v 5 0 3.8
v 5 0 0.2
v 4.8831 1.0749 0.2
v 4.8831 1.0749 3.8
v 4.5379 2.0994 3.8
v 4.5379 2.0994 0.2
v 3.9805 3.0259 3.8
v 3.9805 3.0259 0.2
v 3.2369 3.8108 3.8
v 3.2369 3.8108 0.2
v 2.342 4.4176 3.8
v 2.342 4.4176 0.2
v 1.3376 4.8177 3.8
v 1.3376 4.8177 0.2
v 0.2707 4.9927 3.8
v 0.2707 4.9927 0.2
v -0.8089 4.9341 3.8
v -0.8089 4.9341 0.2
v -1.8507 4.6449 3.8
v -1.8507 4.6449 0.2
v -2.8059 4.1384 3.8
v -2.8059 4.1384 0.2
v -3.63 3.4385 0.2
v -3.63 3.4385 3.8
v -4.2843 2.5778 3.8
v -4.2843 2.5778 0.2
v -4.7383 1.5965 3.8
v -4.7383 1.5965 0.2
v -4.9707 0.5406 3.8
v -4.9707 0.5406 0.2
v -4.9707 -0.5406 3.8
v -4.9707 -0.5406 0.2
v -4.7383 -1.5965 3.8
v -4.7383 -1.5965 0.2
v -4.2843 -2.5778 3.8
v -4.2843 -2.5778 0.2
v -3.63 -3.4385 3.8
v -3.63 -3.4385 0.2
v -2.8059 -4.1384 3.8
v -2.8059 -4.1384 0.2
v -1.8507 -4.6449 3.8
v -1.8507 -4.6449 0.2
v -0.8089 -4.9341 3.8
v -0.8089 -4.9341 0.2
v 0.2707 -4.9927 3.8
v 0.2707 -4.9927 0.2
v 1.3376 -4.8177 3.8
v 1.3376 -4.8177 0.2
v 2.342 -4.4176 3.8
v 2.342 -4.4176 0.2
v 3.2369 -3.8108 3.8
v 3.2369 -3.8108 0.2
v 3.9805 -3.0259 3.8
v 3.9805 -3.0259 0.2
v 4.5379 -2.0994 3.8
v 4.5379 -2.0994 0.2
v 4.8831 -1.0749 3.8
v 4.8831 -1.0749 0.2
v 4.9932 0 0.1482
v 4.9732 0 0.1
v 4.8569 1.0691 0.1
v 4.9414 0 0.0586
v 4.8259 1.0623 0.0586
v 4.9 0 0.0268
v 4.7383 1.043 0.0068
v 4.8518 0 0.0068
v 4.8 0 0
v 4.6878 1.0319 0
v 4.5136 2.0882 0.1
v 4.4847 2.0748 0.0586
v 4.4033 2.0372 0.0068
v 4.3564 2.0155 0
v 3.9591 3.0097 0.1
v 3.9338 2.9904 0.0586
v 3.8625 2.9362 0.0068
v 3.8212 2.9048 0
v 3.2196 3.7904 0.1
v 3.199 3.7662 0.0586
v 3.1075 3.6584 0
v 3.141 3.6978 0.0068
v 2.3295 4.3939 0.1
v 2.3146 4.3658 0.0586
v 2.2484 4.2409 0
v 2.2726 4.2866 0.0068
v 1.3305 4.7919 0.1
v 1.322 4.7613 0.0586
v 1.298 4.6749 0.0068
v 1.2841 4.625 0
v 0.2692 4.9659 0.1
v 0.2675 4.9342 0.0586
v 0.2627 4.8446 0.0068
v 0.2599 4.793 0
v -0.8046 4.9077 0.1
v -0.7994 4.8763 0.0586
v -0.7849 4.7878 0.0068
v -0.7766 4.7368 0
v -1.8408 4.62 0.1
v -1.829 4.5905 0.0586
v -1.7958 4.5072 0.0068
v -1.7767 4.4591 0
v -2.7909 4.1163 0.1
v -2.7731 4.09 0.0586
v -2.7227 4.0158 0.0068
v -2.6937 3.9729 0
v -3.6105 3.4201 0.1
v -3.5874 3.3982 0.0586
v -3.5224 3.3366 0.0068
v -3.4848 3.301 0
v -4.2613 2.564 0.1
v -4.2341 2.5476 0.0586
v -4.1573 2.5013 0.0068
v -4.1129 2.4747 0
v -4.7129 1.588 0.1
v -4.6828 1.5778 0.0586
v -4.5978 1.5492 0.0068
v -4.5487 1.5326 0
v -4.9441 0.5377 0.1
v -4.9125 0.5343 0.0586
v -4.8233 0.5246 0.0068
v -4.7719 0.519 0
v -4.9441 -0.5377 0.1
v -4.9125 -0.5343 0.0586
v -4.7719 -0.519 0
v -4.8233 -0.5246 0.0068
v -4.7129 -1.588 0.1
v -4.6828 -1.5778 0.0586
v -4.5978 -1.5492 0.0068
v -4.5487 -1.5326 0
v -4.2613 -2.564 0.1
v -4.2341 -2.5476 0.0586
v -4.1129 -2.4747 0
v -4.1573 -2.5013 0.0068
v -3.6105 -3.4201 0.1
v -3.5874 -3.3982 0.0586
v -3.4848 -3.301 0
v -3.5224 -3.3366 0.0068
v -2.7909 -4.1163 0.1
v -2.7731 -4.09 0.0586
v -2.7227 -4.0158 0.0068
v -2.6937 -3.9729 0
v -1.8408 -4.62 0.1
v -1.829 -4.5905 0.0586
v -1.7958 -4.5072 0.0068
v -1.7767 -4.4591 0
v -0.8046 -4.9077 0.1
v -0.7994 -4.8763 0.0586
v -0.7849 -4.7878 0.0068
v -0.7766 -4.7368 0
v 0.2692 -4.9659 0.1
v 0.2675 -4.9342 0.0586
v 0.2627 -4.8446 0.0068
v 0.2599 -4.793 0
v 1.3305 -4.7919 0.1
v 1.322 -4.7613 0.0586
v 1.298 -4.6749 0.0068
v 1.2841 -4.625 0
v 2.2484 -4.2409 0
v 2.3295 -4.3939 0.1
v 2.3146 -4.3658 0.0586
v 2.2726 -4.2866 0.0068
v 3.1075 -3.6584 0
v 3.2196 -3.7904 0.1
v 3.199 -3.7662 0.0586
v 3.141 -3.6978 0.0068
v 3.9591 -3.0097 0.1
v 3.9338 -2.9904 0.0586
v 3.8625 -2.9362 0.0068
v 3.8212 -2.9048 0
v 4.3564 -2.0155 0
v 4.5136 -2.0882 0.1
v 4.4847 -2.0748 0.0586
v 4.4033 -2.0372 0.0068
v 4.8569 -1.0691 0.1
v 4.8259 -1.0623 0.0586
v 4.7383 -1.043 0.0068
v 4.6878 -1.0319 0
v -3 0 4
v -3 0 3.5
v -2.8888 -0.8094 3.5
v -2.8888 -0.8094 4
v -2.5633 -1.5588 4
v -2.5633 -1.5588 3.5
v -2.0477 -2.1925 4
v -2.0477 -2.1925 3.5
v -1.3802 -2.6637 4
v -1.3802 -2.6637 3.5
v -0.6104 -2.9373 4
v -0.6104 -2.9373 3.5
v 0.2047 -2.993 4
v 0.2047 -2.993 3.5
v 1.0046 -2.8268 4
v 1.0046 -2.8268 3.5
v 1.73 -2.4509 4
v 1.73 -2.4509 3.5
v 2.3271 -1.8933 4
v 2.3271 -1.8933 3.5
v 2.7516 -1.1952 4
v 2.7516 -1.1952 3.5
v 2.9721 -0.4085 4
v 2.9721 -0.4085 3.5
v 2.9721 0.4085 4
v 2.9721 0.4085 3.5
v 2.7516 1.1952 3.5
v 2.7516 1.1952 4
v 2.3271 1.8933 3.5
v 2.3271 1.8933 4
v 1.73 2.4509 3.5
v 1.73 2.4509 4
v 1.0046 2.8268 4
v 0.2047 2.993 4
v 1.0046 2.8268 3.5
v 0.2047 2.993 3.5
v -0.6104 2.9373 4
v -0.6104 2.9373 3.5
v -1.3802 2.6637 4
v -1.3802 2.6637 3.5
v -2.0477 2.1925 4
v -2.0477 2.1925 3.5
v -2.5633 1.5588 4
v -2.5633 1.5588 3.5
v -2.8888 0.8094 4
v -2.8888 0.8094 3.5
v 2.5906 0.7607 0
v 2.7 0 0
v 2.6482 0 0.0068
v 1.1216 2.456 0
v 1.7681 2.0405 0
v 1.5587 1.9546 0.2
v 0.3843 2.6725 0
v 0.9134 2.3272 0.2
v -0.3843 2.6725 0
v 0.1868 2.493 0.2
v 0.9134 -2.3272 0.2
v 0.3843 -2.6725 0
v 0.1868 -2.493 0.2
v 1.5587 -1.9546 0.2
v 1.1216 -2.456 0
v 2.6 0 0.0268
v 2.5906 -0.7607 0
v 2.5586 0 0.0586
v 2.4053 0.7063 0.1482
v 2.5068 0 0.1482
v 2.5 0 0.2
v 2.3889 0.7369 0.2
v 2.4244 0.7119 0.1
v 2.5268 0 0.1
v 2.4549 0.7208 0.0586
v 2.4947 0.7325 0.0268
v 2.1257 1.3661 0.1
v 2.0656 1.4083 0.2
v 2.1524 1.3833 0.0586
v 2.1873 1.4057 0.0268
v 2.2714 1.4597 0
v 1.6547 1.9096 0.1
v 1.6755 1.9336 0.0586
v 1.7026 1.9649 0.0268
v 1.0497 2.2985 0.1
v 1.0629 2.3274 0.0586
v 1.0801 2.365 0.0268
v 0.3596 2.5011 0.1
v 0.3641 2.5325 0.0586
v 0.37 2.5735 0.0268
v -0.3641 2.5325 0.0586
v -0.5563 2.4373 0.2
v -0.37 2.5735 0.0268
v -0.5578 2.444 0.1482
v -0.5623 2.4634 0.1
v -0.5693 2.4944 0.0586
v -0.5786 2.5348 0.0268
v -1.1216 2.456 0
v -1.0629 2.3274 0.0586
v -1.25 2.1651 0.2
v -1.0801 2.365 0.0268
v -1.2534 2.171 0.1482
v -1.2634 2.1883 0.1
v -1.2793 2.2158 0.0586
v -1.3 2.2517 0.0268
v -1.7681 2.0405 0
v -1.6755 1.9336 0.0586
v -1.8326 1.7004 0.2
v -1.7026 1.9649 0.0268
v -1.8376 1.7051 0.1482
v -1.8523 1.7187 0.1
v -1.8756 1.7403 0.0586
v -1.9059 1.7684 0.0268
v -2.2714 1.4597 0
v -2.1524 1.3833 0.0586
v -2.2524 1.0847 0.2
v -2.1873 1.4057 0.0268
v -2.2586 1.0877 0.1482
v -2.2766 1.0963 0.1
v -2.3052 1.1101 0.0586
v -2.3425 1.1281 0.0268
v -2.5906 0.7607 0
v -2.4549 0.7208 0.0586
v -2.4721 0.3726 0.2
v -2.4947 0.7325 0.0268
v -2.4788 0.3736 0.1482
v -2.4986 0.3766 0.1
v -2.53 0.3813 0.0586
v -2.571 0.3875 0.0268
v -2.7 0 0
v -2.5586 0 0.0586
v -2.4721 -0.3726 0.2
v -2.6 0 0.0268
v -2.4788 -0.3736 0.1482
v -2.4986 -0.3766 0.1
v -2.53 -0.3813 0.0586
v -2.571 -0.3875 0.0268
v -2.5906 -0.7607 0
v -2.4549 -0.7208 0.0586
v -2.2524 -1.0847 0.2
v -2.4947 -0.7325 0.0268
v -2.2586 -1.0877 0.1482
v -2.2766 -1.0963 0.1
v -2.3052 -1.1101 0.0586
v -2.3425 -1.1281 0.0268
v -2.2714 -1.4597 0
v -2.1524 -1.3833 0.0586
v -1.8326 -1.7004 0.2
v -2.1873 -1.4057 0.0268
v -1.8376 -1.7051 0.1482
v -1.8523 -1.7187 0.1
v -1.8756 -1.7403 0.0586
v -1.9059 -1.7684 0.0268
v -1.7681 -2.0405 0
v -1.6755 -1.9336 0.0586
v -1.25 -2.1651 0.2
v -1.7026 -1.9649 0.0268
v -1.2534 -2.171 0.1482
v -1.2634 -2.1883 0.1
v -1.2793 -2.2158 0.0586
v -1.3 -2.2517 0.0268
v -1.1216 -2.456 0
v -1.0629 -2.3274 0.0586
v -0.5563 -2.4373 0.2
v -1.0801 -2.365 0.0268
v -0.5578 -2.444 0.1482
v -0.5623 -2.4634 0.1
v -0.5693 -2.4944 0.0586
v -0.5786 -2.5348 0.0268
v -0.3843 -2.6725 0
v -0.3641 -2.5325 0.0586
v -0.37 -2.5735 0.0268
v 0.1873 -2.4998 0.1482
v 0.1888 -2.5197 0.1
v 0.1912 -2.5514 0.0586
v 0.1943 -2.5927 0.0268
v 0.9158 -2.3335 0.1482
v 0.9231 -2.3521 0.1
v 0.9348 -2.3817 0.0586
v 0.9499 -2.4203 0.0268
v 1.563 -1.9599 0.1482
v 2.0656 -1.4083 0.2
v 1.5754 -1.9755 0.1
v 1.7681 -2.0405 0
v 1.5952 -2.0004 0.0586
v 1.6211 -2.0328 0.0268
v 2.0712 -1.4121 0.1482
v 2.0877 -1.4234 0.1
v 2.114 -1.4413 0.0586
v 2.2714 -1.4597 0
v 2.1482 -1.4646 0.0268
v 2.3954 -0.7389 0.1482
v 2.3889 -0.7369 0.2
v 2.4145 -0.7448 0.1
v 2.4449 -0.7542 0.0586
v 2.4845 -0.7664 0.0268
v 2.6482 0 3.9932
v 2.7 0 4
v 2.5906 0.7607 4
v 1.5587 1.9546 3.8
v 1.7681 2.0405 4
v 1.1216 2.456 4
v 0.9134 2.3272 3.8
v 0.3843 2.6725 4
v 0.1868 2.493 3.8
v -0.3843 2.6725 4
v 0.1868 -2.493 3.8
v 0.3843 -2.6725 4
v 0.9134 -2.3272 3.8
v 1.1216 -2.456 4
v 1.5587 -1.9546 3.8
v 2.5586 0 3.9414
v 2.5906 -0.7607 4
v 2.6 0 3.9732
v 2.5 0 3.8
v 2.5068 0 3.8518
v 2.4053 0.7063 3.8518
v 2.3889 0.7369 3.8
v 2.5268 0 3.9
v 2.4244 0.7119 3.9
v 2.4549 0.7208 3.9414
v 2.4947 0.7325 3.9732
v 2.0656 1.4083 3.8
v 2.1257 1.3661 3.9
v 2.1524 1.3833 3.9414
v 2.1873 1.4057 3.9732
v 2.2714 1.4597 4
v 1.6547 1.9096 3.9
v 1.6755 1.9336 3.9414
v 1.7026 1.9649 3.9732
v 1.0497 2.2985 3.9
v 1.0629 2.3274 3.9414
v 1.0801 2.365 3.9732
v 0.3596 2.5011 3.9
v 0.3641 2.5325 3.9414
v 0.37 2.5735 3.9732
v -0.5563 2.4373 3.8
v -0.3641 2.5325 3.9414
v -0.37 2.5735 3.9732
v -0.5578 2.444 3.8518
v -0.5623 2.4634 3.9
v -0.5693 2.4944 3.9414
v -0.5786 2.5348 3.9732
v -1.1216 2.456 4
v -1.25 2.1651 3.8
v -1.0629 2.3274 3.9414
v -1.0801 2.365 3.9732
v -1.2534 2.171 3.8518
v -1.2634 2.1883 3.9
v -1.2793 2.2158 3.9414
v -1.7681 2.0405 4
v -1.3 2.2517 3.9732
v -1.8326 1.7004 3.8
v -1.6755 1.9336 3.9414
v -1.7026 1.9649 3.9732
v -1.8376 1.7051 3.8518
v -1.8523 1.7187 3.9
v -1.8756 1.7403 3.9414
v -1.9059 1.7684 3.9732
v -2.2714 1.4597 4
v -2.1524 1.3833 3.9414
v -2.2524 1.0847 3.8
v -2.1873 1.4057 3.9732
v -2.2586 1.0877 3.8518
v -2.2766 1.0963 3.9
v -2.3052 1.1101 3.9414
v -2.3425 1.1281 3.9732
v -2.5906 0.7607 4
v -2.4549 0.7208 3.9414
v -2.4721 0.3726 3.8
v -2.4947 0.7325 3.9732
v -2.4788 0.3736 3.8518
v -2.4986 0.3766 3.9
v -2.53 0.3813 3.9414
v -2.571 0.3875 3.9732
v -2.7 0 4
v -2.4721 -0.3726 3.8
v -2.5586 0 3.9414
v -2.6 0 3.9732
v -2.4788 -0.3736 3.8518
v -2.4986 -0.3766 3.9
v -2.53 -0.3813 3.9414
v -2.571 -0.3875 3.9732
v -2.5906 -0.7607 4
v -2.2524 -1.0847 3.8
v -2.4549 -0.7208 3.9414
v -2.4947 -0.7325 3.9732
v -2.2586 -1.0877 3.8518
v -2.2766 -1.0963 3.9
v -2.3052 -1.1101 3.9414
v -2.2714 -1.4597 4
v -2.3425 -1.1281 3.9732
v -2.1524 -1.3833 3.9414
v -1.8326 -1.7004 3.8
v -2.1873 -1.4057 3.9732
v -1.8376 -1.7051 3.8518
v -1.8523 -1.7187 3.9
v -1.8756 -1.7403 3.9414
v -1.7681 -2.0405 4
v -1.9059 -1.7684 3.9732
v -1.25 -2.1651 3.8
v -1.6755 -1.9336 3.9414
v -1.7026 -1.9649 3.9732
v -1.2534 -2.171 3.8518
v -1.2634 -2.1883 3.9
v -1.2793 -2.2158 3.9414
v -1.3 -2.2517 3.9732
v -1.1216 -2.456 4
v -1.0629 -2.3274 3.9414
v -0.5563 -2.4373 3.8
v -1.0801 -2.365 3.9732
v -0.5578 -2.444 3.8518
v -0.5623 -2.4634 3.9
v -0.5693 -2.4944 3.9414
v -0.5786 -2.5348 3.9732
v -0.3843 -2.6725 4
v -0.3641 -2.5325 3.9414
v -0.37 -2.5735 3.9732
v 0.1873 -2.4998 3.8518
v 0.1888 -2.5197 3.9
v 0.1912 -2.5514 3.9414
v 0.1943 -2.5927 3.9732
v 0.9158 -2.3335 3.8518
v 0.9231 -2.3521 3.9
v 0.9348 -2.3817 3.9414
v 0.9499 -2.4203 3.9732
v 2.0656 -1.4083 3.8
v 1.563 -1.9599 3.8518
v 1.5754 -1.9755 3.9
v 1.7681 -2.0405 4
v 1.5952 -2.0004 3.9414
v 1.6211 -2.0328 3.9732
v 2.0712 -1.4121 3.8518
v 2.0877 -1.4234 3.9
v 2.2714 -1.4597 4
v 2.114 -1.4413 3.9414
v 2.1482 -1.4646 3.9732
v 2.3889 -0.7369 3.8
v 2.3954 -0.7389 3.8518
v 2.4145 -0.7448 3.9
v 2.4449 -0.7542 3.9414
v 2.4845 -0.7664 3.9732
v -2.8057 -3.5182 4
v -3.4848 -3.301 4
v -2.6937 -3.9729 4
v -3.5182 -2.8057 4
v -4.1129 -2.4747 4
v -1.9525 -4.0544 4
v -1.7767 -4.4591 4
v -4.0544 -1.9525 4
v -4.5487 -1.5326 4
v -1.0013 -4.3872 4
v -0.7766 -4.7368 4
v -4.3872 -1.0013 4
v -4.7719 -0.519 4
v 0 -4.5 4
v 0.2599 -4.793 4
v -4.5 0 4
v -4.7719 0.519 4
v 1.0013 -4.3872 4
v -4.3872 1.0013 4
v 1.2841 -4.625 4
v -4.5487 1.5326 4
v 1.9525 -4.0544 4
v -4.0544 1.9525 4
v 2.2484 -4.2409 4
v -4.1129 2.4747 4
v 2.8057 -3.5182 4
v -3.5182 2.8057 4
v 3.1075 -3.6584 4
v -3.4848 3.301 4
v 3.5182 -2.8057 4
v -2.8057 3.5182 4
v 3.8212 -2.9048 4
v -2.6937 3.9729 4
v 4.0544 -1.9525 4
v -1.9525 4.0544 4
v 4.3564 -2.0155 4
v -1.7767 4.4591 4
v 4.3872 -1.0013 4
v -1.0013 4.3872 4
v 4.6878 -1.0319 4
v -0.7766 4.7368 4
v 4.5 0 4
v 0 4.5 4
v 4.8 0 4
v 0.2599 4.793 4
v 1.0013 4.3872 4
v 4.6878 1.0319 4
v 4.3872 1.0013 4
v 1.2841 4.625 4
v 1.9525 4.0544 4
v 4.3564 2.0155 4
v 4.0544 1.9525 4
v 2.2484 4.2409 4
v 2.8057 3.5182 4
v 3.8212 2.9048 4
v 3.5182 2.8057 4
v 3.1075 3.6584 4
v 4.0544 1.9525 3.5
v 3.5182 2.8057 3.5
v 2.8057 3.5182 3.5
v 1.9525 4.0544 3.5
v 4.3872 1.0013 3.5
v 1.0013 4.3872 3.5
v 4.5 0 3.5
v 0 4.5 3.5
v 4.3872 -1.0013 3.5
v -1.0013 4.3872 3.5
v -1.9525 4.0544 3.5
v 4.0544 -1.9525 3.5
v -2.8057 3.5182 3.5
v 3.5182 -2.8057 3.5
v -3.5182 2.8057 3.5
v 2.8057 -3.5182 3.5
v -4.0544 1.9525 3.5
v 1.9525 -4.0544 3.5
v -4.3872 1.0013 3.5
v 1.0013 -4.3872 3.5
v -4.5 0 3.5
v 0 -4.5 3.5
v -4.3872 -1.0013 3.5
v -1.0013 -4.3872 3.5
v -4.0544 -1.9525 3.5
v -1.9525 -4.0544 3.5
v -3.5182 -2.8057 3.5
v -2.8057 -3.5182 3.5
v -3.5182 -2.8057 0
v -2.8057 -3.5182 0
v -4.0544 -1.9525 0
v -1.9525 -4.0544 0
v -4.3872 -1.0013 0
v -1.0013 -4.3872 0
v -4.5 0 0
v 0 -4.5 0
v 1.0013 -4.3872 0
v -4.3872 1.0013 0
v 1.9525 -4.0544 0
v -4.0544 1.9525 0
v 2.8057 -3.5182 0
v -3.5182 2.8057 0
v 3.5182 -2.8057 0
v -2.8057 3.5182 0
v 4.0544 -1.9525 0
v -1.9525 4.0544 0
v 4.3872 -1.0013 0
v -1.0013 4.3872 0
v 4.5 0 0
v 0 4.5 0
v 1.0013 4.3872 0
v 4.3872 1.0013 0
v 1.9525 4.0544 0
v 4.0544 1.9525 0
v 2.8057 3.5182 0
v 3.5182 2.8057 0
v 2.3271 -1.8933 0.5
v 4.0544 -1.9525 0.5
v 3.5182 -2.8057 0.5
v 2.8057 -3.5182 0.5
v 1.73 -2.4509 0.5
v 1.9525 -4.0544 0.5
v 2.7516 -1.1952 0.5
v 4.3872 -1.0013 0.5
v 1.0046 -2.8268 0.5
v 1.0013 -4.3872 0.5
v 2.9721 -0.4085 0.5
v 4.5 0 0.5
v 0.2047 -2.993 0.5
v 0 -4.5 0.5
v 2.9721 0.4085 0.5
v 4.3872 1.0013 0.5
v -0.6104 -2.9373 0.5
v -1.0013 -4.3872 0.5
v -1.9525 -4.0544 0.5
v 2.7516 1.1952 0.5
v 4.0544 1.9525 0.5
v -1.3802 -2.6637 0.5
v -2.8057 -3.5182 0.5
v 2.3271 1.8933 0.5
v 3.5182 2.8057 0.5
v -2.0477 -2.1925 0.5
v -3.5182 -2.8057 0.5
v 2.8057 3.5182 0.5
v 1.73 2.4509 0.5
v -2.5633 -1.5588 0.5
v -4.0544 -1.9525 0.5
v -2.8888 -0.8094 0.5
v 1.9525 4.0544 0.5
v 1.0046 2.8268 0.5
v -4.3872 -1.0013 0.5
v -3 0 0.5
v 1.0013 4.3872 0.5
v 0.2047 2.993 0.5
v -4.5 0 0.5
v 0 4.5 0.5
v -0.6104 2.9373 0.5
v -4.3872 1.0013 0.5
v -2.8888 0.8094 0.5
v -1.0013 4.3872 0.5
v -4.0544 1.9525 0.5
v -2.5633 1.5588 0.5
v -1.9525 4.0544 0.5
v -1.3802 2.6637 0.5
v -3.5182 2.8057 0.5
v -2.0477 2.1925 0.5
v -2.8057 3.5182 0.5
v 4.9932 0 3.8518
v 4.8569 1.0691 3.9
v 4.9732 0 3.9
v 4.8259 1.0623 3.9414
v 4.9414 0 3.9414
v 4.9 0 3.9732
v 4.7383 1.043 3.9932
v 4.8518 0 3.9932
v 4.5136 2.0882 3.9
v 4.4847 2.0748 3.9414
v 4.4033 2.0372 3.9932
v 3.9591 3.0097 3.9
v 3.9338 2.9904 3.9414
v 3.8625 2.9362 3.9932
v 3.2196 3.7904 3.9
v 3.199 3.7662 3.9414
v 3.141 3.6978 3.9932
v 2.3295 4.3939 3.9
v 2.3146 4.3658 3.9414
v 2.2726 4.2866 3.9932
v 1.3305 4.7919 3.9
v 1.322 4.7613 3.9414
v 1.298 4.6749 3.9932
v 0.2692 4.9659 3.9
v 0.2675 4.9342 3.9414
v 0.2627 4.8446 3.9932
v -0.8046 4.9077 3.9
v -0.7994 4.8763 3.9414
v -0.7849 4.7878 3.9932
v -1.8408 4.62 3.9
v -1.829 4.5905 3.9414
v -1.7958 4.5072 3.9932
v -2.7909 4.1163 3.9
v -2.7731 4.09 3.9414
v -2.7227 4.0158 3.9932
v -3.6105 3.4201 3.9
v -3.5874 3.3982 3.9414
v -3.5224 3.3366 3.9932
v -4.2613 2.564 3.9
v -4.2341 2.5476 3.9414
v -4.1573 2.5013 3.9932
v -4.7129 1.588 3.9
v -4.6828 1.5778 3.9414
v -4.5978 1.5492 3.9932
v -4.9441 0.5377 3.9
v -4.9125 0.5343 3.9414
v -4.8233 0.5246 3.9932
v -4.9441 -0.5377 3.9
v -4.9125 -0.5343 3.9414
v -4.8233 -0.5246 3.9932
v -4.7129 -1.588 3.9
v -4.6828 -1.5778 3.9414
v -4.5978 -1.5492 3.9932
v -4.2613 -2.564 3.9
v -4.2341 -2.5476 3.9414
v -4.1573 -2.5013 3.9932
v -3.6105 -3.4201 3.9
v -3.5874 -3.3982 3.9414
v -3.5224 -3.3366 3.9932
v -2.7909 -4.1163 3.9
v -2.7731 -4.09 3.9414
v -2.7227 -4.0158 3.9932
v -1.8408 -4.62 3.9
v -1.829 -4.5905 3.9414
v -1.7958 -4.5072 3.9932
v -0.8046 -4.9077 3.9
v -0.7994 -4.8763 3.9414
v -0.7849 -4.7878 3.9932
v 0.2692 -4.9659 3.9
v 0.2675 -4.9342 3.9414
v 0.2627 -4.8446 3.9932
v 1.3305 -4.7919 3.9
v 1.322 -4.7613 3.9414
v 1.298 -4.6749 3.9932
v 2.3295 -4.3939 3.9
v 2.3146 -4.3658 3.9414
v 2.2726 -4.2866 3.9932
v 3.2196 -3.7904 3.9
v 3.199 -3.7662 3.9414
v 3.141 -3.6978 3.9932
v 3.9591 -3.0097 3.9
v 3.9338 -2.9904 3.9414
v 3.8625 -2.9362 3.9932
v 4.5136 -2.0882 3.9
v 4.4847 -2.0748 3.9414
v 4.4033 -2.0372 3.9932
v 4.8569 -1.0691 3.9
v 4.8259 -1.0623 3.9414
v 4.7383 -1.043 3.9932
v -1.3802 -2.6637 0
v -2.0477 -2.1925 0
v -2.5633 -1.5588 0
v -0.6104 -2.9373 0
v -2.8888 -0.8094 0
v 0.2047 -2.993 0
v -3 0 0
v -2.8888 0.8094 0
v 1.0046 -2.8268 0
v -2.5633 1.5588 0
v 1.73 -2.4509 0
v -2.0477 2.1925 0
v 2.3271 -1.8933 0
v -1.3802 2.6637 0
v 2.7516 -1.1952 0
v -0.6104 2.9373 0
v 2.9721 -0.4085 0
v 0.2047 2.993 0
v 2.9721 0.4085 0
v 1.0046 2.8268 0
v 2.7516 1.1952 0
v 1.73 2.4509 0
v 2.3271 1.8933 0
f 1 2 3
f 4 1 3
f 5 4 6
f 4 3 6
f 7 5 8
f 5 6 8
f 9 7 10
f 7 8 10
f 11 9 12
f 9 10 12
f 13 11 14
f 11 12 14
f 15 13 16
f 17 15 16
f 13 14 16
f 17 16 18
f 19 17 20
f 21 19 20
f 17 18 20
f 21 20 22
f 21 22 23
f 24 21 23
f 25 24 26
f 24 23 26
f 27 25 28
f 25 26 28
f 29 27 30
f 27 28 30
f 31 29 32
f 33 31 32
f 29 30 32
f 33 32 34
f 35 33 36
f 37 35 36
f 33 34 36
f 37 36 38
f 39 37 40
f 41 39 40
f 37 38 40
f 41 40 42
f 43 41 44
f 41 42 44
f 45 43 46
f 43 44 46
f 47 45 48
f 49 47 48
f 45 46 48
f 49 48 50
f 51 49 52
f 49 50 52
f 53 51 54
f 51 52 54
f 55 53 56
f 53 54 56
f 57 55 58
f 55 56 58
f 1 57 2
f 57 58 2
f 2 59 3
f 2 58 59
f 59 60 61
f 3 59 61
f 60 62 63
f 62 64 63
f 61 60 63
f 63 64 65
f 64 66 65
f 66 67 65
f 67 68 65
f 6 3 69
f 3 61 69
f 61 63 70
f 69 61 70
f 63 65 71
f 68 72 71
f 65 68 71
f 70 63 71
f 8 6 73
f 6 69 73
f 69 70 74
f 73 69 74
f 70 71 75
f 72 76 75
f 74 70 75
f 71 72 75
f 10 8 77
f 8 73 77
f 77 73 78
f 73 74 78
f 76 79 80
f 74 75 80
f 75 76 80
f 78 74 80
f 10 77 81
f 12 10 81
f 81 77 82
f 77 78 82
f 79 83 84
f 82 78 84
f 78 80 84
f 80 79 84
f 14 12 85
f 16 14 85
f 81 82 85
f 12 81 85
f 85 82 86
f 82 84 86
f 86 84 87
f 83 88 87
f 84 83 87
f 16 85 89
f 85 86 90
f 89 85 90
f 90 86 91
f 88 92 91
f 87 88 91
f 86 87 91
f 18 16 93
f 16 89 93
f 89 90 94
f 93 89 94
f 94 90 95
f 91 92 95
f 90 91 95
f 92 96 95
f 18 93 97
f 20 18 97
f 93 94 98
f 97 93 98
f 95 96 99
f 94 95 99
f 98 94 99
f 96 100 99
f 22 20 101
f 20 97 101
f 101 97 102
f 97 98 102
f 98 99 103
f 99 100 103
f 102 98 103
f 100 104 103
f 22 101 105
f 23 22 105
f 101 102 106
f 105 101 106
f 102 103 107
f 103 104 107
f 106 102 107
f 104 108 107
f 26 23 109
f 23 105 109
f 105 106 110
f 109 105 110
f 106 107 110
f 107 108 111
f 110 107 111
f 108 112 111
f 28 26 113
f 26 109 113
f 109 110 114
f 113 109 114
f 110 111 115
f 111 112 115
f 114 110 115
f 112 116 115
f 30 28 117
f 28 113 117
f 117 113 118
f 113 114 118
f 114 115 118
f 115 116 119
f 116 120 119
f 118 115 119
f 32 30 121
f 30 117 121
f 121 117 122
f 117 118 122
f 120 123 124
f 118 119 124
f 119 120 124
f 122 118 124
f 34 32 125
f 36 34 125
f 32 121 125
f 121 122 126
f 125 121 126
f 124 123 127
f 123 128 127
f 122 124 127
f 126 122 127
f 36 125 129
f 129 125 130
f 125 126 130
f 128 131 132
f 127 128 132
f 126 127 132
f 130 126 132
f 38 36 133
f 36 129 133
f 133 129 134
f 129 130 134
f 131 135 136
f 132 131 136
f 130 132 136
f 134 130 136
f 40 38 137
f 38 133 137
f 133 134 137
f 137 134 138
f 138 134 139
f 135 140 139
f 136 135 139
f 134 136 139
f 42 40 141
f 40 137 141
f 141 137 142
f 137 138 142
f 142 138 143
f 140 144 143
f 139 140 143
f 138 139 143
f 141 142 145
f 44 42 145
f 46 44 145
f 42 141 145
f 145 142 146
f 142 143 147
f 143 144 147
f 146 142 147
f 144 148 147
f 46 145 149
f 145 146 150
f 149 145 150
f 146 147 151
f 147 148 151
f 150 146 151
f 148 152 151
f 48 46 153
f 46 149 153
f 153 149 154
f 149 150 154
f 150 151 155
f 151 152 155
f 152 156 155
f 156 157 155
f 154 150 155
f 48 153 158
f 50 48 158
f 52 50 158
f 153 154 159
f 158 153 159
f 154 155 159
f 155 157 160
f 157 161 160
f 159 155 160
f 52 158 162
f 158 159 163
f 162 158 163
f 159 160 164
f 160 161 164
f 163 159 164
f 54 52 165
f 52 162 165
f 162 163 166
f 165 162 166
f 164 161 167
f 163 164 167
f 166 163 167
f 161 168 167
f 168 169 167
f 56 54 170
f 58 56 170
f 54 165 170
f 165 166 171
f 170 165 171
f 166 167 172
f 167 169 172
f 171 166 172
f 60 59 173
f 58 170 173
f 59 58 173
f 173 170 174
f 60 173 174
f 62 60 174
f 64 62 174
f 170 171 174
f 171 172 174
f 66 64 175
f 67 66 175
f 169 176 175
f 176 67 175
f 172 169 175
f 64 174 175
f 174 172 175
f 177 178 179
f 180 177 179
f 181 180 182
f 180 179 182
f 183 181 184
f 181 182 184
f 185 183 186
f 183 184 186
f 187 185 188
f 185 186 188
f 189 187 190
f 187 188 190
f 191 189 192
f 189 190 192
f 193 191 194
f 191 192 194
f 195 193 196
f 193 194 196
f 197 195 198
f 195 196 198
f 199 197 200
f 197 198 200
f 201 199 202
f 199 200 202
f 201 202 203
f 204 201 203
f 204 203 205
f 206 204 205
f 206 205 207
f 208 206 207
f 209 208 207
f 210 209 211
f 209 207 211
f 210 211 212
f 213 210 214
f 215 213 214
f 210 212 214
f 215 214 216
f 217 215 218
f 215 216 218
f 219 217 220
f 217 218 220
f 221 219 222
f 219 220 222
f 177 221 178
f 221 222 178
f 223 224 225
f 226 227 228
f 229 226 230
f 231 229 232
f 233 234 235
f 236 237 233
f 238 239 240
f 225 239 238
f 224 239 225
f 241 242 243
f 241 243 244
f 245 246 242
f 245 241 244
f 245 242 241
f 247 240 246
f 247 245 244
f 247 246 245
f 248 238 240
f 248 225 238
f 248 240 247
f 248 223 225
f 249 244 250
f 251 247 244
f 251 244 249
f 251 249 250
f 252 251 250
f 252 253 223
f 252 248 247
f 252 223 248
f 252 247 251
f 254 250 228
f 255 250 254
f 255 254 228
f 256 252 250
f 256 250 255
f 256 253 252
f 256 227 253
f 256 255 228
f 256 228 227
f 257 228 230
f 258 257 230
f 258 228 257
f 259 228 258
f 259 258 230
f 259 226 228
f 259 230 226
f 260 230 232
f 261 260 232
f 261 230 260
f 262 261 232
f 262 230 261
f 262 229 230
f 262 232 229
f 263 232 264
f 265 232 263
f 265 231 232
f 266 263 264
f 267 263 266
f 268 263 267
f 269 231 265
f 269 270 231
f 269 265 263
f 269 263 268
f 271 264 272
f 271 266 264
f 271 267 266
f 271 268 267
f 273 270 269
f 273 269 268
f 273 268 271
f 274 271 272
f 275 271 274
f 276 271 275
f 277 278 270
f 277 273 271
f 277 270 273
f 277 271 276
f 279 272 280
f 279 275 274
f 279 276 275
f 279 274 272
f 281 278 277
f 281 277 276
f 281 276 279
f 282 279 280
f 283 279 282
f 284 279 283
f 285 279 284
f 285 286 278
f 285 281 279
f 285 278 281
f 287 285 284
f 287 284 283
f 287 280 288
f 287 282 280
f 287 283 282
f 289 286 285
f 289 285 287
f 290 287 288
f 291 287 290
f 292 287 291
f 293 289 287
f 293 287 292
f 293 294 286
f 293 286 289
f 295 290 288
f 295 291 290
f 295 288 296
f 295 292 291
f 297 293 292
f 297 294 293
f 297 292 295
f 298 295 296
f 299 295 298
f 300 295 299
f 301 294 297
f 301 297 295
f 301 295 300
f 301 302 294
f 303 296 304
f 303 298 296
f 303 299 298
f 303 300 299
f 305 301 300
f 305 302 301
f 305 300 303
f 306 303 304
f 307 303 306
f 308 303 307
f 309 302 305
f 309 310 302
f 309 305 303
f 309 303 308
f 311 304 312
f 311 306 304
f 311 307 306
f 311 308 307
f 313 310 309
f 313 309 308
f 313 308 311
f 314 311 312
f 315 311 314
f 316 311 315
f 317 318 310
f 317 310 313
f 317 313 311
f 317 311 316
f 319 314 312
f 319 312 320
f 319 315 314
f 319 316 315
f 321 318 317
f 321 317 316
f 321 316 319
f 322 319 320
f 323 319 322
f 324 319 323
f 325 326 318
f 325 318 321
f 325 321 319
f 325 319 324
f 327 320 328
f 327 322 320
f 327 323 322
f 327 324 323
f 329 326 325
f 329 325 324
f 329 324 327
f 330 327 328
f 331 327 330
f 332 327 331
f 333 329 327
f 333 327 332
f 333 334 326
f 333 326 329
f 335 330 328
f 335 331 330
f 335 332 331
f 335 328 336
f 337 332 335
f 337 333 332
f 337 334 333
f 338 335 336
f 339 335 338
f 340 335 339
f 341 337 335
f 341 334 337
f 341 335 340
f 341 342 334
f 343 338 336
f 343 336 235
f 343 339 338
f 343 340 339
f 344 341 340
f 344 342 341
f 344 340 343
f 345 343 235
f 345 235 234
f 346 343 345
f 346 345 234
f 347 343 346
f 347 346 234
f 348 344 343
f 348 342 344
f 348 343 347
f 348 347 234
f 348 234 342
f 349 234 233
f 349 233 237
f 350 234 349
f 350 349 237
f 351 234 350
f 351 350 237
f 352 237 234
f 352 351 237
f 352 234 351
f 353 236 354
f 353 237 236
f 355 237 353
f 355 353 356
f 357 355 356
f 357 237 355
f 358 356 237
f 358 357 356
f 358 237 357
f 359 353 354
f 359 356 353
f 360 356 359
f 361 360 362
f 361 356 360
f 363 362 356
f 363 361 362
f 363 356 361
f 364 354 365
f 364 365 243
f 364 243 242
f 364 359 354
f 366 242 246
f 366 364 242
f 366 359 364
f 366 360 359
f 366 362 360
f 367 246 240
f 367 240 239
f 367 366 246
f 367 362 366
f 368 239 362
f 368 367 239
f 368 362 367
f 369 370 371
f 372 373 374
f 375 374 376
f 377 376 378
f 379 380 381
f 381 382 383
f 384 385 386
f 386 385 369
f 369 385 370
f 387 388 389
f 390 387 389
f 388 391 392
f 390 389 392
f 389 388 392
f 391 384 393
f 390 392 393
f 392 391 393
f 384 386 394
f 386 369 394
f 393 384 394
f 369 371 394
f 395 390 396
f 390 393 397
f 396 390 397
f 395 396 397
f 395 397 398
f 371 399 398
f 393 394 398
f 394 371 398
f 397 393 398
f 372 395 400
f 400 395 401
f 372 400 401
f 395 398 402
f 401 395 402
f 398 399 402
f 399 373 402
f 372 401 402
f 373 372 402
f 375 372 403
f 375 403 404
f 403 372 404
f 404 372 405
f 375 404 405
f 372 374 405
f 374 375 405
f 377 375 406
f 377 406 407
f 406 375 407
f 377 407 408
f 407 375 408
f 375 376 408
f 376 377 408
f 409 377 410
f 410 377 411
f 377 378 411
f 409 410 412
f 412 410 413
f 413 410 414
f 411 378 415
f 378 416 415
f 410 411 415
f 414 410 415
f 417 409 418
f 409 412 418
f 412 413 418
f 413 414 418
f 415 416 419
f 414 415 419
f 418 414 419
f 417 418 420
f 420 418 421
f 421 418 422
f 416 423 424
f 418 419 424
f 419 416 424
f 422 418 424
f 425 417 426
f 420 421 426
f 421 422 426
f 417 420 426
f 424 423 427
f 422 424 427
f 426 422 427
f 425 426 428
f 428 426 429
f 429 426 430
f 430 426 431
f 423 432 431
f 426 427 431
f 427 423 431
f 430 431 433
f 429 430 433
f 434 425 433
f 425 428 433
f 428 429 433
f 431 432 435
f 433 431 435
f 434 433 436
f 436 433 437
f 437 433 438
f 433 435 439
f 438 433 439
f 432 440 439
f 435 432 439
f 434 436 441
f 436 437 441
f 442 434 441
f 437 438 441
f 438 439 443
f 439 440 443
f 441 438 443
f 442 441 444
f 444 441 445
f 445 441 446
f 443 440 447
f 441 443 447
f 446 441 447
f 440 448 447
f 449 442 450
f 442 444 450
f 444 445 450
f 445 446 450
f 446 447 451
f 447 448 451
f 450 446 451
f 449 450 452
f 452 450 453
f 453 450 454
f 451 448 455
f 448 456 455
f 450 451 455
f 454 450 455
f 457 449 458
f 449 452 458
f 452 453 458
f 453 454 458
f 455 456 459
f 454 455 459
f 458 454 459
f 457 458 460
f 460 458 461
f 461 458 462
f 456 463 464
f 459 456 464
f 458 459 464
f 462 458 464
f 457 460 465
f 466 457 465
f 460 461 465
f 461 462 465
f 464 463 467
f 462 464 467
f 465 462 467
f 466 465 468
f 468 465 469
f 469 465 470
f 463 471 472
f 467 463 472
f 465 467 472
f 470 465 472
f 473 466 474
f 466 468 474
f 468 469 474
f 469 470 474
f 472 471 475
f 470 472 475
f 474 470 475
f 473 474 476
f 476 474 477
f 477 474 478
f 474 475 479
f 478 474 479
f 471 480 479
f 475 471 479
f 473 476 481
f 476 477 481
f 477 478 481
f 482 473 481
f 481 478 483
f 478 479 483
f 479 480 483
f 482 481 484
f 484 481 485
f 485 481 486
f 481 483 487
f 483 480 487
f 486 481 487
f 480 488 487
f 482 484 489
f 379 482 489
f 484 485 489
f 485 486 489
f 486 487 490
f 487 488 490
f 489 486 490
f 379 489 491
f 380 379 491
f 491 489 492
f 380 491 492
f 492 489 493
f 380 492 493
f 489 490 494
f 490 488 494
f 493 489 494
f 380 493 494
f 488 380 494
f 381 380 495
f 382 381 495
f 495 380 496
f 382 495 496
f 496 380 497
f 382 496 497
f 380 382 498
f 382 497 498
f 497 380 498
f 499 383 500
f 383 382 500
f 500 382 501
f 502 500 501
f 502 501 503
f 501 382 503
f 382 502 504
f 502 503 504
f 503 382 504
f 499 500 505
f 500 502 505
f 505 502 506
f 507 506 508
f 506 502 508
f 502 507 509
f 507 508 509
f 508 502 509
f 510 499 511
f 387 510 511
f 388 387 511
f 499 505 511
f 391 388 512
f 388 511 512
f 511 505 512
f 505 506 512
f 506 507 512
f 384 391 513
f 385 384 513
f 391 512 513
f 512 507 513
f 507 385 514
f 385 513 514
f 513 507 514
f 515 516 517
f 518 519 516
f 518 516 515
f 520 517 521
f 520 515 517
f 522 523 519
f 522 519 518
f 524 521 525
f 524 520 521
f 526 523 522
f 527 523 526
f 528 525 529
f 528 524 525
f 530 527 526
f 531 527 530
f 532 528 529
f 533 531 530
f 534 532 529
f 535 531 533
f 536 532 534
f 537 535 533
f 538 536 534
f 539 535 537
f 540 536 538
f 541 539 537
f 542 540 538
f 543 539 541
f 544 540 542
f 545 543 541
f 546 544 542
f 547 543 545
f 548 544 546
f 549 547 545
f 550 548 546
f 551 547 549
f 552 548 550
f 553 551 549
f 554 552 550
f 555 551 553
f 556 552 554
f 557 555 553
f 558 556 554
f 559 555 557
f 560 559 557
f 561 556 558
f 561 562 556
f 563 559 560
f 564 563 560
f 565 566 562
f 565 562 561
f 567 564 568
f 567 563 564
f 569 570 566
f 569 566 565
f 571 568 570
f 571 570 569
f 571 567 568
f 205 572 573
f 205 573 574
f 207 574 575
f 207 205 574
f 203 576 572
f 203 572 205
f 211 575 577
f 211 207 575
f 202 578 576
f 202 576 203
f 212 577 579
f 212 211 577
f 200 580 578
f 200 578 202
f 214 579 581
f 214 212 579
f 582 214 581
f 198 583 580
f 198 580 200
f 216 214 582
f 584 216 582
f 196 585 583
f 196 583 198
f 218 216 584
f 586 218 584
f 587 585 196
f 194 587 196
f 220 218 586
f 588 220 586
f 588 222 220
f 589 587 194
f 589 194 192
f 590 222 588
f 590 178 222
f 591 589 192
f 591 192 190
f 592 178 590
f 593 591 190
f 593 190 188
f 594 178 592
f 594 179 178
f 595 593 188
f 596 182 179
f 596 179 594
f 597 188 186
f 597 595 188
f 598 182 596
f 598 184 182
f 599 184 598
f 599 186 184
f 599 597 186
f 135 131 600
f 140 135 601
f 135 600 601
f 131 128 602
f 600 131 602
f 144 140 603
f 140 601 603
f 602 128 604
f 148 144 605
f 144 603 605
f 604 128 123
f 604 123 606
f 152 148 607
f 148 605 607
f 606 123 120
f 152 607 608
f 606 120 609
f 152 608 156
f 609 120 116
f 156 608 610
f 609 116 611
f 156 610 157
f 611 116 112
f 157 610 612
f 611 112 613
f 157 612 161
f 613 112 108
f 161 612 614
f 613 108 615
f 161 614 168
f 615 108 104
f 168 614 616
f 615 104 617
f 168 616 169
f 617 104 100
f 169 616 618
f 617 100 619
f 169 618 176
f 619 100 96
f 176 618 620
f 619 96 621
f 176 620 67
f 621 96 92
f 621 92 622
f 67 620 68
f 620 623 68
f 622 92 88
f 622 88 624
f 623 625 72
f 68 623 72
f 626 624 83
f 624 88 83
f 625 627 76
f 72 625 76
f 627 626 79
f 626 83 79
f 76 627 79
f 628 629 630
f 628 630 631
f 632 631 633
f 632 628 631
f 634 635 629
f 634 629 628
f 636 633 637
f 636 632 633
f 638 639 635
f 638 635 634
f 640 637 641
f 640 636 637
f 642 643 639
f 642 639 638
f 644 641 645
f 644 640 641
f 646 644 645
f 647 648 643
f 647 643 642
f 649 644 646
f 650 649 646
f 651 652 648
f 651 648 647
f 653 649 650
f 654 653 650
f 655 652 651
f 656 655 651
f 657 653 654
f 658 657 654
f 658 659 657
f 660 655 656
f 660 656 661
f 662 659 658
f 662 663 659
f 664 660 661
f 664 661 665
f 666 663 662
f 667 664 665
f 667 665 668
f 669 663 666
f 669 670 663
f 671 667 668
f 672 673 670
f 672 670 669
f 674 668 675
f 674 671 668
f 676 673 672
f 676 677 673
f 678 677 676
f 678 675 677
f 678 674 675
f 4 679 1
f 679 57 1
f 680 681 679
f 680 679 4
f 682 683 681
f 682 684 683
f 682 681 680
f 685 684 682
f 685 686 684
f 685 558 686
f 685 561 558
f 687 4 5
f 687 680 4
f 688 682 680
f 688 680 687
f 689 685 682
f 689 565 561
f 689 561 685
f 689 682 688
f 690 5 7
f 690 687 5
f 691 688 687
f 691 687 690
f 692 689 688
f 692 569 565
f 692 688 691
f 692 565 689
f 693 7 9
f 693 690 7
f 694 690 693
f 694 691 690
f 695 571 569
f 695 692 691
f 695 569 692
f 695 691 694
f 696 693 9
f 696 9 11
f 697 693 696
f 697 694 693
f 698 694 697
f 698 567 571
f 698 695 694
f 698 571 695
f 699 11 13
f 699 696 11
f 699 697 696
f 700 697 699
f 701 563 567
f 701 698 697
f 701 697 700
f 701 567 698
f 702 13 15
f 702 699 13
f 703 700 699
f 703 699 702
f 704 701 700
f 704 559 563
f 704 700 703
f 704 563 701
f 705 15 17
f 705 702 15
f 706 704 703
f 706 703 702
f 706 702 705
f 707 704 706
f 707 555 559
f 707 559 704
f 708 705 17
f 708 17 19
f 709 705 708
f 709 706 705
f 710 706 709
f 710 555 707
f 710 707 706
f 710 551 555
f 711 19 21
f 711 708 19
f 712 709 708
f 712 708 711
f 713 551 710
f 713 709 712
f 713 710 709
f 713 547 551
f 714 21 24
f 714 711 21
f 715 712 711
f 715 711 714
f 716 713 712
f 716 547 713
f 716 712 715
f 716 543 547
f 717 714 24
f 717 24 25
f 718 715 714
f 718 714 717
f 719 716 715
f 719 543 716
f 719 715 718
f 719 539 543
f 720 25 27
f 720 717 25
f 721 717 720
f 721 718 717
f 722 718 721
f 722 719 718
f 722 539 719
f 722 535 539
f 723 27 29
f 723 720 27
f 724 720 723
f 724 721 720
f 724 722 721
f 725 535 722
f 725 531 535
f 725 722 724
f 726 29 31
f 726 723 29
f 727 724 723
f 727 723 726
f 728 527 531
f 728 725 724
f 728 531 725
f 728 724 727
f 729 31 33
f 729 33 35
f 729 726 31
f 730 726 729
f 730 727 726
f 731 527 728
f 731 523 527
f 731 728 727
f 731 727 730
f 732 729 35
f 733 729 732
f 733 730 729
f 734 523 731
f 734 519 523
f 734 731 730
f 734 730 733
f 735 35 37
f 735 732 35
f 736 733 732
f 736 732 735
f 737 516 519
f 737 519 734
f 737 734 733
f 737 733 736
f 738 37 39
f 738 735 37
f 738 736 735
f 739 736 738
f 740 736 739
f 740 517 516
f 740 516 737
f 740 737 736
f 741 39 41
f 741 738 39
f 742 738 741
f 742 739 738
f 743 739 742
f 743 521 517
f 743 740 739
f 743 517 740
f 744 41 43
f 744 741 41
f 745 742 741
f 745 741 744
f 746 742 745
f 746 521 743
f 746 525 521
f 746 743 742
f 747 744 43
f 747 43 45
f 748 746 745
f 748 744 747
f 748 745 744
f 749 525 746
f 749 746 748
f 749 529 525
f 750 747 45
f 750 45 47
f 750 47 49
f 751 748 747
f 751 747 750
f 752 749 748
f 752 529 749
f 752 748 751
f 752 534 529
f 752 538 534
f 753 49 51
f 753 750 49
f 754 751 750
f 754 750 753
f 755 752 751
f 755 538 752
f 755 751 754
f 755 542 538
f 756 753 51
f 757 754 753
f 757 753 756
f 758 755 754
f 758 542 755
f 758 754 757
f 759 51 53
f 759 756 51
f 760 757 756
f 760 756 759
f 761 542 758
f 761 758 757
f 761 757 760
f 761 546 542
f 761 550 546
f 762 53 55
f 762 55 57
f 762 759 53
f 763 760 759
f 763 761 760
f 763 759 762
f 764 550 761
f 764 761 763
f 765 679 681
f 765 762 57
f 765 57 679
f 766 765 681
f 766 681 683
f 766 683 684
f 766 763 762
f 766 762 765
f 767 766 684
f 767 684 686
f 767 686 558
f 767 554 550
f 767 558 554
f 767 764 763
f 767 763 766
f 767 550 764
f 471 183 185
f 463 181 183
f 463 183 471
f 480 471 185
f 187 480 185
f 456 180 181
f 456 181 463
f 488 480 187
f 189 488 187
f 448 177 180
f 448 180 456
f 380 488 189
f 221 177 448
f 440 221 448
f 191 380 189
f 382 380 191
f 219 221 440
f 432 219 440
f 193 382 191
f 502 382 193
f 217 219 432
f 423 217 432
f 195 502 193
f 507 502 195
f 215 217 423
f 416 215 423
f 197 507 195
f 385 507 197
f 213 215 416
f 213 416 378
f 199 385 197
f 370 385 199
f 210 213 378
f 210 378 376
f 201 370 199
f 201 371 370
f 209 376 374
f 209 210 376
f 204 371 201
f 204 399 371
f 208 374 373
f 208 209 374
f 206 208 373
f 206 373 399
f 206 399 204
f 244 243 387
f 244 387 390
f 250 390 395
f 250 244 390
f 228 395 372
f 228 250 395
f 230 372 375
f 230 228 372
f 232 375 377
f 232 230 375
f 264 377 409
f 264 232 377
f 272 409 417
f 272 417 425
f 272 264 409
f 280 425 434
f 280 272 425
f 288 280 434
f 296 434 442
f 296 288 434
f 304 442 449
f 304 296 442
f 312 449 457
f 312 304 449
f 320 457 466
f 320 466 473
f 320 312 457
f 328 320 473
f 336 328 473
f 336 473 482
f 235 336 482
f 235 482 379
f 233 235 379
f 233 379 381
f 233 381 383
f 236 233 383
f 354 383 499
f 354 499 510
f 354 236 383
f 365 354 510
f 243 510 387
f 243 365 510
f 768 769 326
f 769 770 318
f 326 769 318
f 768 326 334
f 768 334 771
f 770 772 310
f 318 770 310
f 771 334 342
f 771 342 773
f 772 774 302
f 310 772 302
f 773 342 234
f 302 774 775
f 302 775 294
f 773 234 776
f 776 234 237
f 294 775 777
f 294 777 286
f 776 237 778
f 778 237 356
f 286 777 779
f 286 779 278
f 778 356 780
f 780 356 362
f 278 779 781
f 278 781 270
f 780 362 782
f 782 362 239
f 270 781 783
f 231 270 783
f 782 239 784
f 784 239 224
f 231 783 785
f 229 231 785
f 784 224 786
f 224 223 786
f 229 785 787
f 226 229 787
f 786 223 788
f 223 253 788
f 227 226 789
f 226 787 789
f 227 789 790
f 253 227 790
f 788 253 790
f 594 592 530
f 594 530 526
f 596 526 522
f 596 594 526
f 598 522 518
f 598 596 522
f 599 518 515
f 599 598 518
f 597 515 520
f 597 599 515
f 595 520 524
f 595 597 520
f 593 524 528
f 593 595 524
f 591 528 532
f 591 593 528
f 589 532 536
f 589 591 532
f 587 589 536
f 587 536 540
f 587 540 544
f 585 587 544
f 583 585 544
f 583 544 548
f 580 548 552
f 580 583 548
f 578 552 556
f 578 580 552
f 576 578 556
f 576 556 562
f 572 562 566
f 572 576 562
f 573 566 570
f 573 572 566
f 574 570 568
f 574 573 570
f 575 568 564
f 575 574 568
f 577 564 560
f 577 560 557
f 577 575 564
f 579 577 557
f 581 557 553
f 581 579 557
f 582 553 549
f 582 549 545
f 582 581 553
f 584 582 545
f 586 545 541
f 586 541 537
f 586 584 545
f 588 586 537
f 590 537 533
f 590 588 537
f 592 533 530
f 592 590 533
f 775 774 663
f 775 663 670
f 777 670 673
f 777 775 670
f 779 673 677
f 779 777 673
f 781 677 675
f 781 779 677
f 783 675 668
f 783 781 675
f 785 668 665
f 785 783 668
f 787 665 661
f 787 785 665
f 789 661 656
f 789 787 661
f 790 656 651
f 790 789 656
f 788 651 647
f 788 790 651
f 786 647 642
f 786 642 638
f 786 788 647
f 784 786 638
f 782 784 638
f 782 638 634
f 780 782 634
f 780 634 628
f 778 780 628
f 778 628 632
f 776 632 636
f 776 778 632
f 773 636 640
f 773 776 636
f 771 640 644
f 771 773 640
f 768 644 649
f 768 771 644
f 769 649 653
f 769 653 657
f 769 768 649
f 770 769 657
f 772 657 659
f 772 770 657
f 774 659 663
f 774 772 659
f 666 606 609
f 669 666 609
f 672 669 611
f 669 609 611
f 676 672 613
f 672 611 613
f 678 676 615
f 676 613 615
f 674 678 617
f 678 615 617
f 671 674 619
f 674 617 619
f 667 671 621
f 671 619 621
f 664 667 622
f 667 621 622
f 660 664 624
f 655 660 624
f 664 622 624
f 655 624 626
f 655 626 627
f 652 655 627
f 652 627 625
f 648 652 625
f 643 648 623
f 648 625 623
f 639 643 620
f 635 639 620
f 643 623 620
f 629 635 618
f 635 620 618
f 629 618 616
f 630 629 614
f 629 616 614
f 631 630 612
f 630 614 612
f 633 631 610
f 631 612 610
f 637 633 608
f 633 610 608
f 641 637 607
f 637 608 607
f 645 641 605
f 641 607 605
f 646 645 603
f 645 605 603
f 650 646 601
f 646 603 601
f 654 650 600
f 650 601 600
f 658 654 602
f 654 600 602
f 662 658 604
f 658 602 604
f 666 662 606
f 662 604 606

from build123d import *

# Parameters (mm, degrees)
SKIZZE1_R                       = 5
SKIZZE1_R_2                     = 2.5
AUFSATZ_LINEAR_AUSTRAGEN1_DEPTH = 4
VERRUNDUNG1_R                   = 0.2
SKIZZE2_R                       = 4.5
SKIZZE2_R_2                     = 3
SCHNITT_LINEAR_AUSTRAGEN1_DEPTH = 0.5
SCHNITT_LINEAR_START            = -0.5
SKIZZE3_R                       = 4.5
SKIZZE3_R_2                     = 3
SCHNITT_LINEAR_AUSTRAGEN2_DEPTH = 0.5


with BuildPart() as part:
    # Skizze1 → Aufsatz-Linear austragen1 (new body)
    with BuildSketch(Plane.XY):
        Circle(SKIZZE1_R)
        Circle(SKIZZE1_R_2, mode=Mode.SUBTRACT)
    extrude(amount=AUFSATZ_LINEAR_AUSTRAGEN1_DEPTH)

    # Verrundung1
    verrundung1_edges = [part.edges().sort_by_distance(p)[0] for p in [
        (-5, 0, 0),
        (-5, 0, 4),
        (-2.5, 0, 0),
        (-2.5, 0, 4),
    ]]
    fillet(verrundung1_edges, radius=VERRUNDUNG1_R)

    # Skizze2 → Schnitt-Linear austragen1 (cut)
    with BuildSketch(Plane(origin=(0, 0, 0), x_dir=(-1, 0, 0), z_dir=(0, 0, -1))):
        Circle(SKIZZE2_R)
        Circle(SKIZZE2_R_2, mode=Mode.SUBTRACT)
    extrude(amount=-SCHNITT_LINEAR_AUSTRAGEN1_DEPTH, mode=Mode.SUBTRACT)

    # Skizze3 → Schnitt-Linear austragen2 (cut)
    with BuildSketch(Plane.XY.offset(4).offset(SCHNITT_LINEAR_START)):
        with Locations(Location((0, 0, 0), (0, 0, 180))):
            Circle(SKIZZE3_R)
        with Locations(Location((0, 0, 0), (0, 0, 180))):
            Circle(SKIZZE3_R_2, mode=Mode.SUBTRACT)
    extrude(amount=SCHNITT_LINEAR_AUSTRAGEN2_DEPTH, mode=Mode.SUBTRACT)


solid = part.part
